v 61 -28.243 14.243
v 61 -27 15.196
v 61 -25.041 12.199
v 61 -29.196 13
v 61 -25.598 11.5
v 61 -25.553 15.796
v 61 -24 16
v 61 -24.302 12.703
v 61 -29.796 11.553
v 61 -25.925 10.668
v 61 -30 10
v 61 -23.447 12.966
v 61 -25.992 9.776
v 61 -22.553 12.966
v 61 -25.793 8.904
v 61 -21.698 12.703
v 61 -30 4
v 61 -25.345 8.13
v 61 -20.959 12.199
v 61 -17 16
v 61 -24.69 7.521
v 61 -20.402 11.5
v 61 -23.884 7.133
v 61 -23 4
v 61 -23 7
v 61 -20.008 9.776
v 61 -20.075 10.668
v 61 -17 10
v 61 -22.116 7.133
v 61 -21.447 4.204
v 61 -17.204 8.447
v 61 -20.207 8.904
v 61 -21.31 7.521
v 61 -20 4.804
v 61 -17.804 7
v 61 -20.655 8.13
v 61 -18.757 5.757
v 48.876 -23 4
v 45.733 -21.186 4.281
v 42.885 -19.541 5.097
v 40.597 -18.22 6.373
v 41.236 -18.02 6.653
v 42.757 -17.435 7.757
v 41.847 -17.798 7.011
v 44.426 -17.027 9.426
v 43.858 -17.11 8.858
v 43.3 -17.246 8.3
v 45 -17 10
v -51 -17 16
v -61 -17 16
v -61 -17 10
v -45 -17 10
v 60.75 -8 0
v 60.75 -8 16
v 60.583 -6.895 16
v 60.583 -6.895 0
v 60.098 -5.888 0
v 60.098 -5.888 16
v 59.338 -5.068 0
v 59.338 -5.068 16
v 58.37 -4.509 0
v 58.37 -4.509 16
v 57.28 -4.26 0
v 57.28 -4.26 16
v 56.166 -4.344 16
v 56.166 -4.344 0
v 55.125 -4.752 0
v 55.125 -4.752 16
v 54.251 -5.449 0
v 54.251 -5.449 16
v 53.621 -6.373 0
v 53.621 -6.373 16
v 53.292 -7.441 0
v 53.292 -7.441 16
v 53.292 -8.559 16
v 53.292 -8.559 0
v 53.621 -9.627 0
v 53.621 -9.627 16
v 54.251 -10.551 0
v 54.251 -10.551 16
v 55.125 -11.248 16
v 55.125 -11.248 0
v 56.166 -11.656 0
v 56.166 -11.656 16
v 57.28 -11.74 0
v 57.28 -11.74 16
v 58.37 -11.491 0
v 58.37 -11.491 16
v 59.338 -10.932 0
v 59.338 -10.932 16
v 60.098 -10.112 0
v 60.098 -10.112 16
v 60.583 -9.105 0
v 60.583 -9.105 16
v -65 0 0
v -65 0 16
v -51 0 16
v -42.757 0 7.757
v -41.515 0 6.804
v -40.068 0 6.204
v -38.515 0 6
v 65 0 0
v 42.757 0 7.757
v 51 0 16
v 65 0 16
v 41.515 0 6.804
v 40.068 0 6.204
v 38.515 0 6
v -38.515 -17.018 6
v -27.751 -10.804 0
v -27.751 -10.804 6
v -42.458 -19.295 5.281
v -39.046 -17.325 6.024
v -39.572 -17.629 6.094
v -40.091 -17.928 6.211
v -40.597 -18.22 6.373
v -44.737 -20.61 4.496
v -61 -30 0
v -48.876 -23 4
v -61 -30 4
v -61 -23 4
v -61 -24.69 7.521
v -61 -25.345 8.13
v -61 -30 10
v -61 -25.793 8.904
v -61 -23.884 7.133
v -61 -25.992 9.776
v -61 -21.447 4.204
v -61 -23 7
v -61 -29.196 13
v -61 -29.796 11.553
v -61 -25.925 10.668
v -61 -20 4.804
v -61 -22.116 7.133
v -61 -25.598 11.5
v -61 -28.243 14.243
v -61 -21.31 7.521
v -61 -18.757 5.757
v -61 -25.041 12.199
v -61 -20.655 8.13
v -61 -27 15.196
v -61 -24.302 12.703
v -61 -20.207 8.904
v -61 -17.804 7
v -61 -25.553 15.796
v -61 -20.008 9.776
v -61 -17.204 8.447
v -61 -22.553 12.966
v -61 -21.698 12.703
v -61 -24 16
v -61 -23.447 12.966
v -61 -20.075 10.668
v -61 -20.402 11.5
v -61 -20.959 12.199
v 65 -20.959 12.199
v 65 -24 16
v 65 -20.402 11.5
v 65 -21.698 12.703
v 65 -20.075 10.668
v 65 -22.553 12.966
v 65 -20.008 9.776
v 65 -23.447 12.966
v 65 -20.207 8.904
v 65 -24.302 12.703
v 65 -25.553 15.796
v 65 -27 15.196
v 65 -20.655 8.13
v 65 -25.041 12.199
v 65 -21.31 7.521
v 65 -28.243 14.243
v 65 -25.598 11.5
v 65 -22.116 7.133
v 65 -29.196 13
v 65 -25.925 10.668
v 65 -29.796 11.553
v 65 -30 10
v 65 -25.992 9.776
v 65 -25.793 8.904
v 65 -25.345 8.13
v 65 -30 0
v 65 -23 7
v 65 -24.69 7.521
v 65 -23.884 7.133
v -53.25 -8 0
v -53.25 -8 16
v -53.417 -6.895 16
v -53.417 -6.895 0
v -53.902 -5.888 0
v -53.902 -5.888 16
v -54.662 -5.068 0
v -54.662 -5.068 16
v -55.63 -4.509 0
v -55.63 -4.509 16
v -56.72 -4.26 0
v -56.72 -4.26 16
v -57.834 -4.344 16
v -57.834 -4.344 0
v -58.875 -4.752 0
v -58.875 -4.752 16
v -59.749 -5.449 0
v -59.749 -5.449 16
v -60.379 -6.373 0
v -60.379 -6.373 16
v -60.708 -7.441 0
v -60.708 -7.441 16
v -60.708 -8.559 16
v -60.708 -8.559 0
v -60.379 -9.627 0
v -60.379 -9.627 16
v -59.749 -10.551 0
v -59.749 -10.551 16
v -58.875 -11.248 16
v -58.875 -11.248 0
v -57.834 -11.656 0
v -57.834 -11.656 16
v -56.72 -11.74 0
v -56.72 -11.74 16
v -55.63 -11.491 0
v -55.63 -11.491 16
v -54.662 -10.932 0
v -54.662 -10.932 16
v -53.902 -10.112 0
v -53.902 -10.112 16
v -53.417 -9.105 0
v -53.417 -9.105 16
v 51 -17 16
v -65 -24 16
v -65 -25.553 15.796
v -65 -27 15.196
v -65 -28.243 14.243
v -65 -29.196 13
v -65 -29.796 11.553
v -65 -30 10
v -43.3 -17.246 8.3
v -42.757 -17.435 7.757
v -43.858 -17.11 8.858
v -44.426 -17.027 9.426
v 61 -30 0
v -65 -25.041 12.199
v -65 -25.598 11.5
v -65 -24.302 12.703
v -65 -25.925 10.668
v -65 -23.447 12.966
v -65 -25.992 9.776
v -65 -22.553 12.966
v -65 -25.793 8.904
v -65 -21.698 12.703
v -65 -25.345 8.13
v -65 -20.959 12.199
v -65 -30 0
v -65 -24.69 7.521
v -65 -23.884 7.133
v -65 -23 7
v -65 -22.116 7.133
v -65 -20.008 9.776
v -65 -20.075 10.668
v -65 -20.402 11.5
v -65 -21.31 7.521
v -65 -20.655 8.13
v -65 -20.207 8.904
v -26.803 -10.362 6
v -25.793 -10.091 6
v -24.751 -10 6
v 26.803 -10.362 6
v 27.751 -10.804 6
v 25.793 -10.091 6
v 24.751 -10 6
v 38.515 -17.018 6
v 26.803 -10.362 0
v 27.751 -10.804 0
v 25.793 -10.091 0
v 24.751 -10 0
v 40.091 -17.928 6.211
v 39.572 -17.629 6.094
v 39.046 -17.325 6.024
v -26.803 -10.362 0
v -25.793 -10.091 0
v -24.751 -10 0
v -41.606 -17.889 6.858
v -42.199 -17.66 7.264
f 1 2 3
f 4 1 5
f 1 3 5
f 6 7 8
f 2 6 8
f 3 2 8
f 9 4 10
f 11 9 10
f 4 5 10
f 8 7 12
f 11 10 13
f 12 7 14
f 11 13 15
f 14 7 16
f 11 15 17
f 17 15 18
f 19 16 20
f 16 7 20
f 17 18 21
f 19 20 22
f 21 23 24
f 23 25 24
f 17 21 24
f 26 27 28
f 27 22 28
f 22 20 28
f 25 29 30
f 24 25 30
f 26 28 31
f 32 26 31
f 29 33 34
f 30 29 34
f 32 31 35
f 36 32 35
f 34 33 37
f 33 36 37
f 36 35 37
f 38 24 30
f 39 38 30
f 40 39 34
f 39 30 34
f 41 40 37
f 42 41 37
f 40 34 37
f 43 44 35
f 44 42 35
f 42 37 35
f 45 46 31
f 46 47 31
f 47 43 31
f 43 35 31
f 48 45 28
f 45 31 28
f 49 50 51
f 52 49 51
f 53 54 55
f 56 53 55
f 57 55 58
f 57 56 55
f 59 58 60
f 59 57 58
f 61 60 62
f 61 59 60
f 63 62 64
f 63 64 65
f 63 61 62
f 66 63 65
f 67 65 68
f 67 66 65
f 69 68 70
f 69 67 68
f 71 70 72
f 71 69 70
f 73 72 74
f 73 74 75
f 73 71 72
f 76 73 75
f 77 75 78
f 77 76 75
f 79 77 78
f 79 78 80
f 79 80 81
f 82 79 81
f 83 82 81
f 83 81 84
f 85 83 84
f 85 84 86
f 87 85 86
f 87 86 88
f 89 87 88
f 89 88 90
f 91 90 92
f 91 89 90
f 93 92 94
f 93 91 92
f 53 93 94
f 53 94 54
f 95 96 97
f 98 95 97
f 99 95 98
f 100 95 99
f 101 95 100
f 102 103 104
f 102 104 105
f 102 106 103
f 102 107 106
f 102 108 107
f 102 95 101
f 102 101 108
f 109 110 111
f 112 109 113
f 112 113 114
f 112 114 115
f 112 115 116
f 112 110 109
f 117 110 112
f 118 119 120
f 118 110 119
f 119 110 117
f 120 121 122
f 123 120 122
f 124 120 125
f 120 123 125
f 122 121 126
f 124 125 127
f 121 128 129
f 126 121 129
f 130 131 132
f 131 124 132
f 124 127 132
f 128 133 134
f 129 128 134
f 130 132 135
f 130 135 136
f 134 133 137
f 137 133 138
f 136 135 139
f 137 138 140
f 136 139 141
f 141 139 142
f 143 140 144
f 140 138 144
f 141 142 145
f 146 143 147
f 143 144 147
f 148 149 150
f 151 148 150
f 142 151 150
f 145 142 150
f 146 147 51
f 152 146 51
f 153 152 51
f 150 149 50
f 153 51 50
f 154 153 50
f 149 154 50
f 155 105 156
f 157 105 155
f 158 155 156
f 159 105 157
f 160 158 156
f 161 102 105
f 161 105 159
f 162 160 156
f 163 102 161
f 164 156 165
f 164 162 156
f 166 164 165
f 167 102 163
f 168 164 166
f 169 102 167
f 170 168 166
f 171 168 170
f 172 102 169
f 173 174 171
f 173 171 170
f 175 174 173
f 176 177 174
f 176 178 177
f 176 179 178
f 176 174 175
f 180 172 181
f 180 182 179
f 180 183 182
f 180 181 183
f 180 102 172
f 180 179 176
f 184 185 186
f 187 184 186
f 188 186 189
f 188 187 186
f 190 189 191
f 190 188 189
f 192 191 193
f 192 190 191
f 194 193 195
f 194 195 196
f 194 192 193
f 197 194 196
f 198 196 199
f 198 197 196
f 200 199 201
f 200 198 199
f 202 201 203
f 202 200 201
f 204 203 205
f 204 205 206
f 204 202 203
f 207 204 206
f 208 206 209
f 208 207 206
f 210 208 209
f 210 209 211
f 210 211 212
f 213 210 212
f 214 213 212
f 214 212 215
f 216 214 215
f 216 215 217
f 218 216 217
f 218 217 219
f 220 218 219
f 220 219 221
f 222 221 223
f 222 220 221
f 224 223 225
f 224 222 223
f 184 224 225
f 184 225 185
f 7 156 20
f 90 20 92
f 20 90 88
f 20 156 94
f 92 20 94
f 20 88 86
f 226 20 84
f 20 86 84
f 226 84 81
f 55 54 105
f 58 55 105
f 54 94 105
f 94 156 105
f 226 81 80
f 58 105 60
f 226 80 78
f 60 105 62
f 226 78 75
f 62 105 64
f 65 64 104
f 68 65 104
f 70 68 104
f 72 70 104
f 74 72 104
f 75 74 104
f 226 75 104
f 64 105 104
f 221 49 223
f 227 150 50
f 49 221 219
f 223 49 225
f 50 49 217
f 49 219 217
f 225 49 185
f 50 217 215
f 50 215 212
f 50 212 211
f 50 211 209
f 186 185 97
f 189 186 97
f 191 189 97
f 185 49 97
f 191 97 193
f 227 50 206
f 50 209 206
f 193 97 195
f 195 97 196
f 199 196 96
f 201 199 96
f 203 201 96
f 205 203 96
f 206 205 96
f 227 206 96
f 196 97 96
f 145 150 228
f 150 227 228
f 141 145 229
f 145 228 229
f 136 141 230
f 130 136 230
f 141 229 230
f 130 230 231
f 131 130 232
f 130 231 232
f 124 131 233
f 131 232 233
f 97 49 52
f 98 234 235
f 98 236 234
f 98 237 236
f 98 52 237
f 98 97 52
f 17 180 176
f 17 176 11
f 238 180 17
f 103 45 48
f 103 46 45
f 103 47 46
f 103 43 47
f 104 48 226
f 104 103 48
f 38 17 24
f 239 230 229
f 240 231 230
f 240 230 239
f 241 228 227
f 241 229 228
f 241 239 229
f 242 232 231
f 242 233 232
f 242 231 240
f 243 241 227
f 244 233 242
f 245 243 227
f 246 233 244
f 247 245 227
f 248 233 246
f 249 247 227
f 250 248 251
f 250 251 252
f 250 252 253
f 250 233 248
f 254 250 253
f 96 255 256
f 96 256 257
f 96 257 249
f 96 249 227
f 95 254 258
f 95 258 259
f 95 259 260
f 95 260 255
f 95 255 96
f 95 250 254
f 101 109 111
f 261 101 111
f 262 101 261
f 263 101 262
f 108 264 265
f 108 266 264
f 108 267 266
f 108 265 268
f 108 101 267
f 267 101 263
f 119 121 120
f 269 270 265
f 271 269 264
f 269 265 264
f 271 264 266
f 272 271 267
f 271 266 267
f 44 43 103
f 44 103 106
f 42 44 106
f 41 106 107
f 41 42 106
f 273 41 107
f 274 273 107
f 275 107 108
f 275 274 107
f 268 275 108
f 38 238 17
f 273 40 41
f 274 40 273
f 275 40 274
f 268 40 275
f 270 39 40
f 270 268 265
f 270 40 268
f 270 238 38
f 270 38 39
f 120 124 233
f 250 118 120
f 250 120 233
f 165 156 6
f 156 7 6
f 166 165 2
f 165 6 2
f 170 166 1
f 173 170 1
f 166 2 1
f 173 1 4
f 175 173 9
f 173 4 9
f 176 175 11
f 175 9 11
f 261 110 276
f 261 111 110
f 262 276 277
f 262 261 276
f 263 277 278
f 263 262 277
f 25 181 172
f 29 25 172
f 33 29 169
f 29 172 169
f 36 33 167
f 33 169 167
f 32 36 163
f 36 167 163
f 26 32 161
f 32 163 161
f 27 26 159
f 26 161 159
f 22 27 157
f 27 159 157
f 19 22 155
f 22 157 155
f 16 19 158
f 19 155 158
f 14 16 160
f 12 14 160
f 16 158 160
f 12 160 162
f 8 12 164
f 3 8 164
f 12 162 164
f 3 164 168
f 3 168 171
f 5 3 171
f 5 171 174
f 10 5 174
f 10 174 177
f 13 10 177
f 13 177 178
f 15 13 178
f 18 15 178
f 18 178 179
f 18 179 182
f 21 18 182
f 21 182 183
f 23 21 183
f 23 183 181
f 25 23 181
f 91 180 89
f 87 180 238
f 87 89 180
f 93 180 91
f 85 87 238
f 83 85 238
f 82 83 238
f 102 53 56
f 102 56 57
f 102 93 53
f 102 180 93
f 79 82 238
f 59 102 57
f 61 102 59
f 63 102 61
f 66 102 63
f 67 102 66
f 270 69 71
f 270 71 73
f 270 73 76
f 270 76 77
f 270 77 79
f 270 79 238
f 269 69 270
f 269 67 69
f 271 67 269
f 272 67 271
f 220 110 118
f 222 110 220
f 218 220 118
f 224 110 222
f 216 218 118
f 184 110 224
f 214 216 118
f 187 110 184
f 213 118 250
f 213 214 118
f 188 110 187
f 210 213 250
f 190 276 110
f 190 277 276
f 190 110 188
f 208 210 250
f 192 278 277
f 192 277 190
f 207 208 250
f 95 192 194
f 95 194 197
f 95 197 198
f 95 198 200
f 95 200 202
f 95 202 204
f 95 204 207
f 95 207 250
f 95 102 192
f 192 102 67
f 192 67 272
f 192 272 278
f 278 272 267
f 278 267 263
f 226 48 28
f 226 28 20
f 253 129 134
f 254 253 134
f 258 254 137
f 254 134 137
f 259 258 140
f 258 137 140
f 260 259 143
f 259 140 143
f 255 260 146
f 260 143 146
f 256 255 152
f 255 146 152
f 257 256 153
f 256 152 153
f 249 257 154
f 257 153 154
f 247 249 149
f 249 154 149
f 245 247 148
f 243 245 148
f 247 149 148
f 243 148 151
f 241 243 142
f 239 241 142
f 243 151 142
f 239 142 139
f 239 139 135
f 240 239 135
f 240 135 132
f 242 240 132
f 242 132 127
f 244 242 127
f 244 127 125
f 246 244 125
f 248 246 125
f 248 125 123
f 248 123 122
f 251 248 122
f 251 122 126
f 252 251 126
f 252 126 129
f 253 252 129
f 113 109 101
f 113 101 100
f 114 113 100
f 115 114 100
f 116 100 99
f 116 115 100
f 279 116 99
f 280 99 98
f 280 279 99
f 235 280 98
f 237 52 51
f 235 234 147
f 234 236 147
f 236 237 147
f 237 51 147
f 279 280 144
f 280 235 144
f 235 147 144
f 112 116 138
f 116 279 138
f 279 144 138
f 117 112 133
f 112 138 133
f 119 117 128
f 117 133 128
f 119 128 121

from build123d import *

# Parameters (mm, degrees)
SKETCH2_R           = 3.75
BOSS_EXTRUDE1_DEPTH = 16
SKETCH3_R           = 3
CUT_EXTRUDE1_DEPTH  = 131
CUT_EXTRUDE2_DEPTH  = 31
CUT_EXTRUDE3_START  = -4
CUT_EXTRUDE3_DEPTH  = 30
CUT_EXTRUDE4_START  = -4
CUT_EXTRUDE4_DEPTH  = 30
FILLET1_R           = 6


with BuildPart() as part:
    # Sketch2 → Boss-Extrude1 (new body)
    with BuildSketch(Plane.XY):
        Polygon((-65, 0), (65, 0), (65, -30), (61, -30), (26.358983849, -10), (-26.358983849, -10), (-61, -30), (-65, -30), align=None)
        with Locations((-57, -8)):
            Circle(SKETCH2_R, mode=Mode.SUBTRACT)
        with Locations((57, -8)):
            Circle(SKETCH2_R, mode=Mode.SUBTRACT)
    extrude(amount=BOSS_EXTRUDE1_DEPTH)

    # Sketch3 → Cut-Extrude1 (cut, through all)
    with BuildSketch(Plane(origin=(65, 0, 0), x_dir=(0, 0, -1), z_dir=(1, 0, 0))):
        with Locations((-10, -23)):
            Circle(SKETCH3_R)
    extrude(amount=-CUT_EXTRUDE1_DEPTH, mode=Mode.SUBTRACT)

    # Sketch4 → Cut-Extrude2 (cut, through all)
    with BuildSketch(Plane(origin=(0, 0, 0), x_dir=(1, 0, 0), z_dir=(0, 1, 0))):
        Polygon((-51, -16), (-41, -6), (41, -6), (51, -16), align=None)
    extrude(amount=-CUT_EXTRUDE2_DEPTH, mode=Mode.SUBTRACT)

    # Sketch5 → Cut-Extrude3 (cut)
    with BuildSketch(Plane.ZY.offset(65).offset(CUT_EXTRUDE3_START)):
        with BuildLine():
            Line((4, -23), (4, -30))
            Line((4, -30), (16, -30))
            Line((16, -30), (16, -17))
            Line((16, -17), (10, -17))
            ThreePointArc((10, -17), (5.757359313, -18.757359313), (4, -23))
        make_face()
    extrude(amount=-CUT_EXTRUDE3_DEPTH, mode=Mode.SUBTRACT)

    # Sketch6 → Cut-Extrude4 (cut)
    with BuildSketch(Plane(origin=(65, 0, 0), x_dir=(0, 0, -1), z_dir=(1, 0, 0)).offset(CUT_EXTRUDE4_START)):
        with BuildLine():
            Line((-10, -17), (-16, -17))
            Line((-16, -17), (-16, -30))
            Line((-16, -30), (-4, -30))
            Line((-4, -30), (-4, -23))
            ThreePointArc((-4, -23), (-5.757359313, -18.757359313), (-10, -17))
        make_face()
    extrude(amount=-CUT_EXTRUDE4_DEPTH, mode=Mode.SUBTRACT)

    # Fillet1
    fillet1_edges = [part.edges().sort_by_distance(p)[0] for p in [
        (41, -9.226497308, 6),
        (-41, -9.226497308, 6),
        (-26.358983849, -10, 3),
        (26.358983849, -10, 3),
        (63, -30, 16),
        (-63, -30, 16),
    ]]
    fillet(fillet1_edges, radius=FILLET1_R)


solid = part.part
